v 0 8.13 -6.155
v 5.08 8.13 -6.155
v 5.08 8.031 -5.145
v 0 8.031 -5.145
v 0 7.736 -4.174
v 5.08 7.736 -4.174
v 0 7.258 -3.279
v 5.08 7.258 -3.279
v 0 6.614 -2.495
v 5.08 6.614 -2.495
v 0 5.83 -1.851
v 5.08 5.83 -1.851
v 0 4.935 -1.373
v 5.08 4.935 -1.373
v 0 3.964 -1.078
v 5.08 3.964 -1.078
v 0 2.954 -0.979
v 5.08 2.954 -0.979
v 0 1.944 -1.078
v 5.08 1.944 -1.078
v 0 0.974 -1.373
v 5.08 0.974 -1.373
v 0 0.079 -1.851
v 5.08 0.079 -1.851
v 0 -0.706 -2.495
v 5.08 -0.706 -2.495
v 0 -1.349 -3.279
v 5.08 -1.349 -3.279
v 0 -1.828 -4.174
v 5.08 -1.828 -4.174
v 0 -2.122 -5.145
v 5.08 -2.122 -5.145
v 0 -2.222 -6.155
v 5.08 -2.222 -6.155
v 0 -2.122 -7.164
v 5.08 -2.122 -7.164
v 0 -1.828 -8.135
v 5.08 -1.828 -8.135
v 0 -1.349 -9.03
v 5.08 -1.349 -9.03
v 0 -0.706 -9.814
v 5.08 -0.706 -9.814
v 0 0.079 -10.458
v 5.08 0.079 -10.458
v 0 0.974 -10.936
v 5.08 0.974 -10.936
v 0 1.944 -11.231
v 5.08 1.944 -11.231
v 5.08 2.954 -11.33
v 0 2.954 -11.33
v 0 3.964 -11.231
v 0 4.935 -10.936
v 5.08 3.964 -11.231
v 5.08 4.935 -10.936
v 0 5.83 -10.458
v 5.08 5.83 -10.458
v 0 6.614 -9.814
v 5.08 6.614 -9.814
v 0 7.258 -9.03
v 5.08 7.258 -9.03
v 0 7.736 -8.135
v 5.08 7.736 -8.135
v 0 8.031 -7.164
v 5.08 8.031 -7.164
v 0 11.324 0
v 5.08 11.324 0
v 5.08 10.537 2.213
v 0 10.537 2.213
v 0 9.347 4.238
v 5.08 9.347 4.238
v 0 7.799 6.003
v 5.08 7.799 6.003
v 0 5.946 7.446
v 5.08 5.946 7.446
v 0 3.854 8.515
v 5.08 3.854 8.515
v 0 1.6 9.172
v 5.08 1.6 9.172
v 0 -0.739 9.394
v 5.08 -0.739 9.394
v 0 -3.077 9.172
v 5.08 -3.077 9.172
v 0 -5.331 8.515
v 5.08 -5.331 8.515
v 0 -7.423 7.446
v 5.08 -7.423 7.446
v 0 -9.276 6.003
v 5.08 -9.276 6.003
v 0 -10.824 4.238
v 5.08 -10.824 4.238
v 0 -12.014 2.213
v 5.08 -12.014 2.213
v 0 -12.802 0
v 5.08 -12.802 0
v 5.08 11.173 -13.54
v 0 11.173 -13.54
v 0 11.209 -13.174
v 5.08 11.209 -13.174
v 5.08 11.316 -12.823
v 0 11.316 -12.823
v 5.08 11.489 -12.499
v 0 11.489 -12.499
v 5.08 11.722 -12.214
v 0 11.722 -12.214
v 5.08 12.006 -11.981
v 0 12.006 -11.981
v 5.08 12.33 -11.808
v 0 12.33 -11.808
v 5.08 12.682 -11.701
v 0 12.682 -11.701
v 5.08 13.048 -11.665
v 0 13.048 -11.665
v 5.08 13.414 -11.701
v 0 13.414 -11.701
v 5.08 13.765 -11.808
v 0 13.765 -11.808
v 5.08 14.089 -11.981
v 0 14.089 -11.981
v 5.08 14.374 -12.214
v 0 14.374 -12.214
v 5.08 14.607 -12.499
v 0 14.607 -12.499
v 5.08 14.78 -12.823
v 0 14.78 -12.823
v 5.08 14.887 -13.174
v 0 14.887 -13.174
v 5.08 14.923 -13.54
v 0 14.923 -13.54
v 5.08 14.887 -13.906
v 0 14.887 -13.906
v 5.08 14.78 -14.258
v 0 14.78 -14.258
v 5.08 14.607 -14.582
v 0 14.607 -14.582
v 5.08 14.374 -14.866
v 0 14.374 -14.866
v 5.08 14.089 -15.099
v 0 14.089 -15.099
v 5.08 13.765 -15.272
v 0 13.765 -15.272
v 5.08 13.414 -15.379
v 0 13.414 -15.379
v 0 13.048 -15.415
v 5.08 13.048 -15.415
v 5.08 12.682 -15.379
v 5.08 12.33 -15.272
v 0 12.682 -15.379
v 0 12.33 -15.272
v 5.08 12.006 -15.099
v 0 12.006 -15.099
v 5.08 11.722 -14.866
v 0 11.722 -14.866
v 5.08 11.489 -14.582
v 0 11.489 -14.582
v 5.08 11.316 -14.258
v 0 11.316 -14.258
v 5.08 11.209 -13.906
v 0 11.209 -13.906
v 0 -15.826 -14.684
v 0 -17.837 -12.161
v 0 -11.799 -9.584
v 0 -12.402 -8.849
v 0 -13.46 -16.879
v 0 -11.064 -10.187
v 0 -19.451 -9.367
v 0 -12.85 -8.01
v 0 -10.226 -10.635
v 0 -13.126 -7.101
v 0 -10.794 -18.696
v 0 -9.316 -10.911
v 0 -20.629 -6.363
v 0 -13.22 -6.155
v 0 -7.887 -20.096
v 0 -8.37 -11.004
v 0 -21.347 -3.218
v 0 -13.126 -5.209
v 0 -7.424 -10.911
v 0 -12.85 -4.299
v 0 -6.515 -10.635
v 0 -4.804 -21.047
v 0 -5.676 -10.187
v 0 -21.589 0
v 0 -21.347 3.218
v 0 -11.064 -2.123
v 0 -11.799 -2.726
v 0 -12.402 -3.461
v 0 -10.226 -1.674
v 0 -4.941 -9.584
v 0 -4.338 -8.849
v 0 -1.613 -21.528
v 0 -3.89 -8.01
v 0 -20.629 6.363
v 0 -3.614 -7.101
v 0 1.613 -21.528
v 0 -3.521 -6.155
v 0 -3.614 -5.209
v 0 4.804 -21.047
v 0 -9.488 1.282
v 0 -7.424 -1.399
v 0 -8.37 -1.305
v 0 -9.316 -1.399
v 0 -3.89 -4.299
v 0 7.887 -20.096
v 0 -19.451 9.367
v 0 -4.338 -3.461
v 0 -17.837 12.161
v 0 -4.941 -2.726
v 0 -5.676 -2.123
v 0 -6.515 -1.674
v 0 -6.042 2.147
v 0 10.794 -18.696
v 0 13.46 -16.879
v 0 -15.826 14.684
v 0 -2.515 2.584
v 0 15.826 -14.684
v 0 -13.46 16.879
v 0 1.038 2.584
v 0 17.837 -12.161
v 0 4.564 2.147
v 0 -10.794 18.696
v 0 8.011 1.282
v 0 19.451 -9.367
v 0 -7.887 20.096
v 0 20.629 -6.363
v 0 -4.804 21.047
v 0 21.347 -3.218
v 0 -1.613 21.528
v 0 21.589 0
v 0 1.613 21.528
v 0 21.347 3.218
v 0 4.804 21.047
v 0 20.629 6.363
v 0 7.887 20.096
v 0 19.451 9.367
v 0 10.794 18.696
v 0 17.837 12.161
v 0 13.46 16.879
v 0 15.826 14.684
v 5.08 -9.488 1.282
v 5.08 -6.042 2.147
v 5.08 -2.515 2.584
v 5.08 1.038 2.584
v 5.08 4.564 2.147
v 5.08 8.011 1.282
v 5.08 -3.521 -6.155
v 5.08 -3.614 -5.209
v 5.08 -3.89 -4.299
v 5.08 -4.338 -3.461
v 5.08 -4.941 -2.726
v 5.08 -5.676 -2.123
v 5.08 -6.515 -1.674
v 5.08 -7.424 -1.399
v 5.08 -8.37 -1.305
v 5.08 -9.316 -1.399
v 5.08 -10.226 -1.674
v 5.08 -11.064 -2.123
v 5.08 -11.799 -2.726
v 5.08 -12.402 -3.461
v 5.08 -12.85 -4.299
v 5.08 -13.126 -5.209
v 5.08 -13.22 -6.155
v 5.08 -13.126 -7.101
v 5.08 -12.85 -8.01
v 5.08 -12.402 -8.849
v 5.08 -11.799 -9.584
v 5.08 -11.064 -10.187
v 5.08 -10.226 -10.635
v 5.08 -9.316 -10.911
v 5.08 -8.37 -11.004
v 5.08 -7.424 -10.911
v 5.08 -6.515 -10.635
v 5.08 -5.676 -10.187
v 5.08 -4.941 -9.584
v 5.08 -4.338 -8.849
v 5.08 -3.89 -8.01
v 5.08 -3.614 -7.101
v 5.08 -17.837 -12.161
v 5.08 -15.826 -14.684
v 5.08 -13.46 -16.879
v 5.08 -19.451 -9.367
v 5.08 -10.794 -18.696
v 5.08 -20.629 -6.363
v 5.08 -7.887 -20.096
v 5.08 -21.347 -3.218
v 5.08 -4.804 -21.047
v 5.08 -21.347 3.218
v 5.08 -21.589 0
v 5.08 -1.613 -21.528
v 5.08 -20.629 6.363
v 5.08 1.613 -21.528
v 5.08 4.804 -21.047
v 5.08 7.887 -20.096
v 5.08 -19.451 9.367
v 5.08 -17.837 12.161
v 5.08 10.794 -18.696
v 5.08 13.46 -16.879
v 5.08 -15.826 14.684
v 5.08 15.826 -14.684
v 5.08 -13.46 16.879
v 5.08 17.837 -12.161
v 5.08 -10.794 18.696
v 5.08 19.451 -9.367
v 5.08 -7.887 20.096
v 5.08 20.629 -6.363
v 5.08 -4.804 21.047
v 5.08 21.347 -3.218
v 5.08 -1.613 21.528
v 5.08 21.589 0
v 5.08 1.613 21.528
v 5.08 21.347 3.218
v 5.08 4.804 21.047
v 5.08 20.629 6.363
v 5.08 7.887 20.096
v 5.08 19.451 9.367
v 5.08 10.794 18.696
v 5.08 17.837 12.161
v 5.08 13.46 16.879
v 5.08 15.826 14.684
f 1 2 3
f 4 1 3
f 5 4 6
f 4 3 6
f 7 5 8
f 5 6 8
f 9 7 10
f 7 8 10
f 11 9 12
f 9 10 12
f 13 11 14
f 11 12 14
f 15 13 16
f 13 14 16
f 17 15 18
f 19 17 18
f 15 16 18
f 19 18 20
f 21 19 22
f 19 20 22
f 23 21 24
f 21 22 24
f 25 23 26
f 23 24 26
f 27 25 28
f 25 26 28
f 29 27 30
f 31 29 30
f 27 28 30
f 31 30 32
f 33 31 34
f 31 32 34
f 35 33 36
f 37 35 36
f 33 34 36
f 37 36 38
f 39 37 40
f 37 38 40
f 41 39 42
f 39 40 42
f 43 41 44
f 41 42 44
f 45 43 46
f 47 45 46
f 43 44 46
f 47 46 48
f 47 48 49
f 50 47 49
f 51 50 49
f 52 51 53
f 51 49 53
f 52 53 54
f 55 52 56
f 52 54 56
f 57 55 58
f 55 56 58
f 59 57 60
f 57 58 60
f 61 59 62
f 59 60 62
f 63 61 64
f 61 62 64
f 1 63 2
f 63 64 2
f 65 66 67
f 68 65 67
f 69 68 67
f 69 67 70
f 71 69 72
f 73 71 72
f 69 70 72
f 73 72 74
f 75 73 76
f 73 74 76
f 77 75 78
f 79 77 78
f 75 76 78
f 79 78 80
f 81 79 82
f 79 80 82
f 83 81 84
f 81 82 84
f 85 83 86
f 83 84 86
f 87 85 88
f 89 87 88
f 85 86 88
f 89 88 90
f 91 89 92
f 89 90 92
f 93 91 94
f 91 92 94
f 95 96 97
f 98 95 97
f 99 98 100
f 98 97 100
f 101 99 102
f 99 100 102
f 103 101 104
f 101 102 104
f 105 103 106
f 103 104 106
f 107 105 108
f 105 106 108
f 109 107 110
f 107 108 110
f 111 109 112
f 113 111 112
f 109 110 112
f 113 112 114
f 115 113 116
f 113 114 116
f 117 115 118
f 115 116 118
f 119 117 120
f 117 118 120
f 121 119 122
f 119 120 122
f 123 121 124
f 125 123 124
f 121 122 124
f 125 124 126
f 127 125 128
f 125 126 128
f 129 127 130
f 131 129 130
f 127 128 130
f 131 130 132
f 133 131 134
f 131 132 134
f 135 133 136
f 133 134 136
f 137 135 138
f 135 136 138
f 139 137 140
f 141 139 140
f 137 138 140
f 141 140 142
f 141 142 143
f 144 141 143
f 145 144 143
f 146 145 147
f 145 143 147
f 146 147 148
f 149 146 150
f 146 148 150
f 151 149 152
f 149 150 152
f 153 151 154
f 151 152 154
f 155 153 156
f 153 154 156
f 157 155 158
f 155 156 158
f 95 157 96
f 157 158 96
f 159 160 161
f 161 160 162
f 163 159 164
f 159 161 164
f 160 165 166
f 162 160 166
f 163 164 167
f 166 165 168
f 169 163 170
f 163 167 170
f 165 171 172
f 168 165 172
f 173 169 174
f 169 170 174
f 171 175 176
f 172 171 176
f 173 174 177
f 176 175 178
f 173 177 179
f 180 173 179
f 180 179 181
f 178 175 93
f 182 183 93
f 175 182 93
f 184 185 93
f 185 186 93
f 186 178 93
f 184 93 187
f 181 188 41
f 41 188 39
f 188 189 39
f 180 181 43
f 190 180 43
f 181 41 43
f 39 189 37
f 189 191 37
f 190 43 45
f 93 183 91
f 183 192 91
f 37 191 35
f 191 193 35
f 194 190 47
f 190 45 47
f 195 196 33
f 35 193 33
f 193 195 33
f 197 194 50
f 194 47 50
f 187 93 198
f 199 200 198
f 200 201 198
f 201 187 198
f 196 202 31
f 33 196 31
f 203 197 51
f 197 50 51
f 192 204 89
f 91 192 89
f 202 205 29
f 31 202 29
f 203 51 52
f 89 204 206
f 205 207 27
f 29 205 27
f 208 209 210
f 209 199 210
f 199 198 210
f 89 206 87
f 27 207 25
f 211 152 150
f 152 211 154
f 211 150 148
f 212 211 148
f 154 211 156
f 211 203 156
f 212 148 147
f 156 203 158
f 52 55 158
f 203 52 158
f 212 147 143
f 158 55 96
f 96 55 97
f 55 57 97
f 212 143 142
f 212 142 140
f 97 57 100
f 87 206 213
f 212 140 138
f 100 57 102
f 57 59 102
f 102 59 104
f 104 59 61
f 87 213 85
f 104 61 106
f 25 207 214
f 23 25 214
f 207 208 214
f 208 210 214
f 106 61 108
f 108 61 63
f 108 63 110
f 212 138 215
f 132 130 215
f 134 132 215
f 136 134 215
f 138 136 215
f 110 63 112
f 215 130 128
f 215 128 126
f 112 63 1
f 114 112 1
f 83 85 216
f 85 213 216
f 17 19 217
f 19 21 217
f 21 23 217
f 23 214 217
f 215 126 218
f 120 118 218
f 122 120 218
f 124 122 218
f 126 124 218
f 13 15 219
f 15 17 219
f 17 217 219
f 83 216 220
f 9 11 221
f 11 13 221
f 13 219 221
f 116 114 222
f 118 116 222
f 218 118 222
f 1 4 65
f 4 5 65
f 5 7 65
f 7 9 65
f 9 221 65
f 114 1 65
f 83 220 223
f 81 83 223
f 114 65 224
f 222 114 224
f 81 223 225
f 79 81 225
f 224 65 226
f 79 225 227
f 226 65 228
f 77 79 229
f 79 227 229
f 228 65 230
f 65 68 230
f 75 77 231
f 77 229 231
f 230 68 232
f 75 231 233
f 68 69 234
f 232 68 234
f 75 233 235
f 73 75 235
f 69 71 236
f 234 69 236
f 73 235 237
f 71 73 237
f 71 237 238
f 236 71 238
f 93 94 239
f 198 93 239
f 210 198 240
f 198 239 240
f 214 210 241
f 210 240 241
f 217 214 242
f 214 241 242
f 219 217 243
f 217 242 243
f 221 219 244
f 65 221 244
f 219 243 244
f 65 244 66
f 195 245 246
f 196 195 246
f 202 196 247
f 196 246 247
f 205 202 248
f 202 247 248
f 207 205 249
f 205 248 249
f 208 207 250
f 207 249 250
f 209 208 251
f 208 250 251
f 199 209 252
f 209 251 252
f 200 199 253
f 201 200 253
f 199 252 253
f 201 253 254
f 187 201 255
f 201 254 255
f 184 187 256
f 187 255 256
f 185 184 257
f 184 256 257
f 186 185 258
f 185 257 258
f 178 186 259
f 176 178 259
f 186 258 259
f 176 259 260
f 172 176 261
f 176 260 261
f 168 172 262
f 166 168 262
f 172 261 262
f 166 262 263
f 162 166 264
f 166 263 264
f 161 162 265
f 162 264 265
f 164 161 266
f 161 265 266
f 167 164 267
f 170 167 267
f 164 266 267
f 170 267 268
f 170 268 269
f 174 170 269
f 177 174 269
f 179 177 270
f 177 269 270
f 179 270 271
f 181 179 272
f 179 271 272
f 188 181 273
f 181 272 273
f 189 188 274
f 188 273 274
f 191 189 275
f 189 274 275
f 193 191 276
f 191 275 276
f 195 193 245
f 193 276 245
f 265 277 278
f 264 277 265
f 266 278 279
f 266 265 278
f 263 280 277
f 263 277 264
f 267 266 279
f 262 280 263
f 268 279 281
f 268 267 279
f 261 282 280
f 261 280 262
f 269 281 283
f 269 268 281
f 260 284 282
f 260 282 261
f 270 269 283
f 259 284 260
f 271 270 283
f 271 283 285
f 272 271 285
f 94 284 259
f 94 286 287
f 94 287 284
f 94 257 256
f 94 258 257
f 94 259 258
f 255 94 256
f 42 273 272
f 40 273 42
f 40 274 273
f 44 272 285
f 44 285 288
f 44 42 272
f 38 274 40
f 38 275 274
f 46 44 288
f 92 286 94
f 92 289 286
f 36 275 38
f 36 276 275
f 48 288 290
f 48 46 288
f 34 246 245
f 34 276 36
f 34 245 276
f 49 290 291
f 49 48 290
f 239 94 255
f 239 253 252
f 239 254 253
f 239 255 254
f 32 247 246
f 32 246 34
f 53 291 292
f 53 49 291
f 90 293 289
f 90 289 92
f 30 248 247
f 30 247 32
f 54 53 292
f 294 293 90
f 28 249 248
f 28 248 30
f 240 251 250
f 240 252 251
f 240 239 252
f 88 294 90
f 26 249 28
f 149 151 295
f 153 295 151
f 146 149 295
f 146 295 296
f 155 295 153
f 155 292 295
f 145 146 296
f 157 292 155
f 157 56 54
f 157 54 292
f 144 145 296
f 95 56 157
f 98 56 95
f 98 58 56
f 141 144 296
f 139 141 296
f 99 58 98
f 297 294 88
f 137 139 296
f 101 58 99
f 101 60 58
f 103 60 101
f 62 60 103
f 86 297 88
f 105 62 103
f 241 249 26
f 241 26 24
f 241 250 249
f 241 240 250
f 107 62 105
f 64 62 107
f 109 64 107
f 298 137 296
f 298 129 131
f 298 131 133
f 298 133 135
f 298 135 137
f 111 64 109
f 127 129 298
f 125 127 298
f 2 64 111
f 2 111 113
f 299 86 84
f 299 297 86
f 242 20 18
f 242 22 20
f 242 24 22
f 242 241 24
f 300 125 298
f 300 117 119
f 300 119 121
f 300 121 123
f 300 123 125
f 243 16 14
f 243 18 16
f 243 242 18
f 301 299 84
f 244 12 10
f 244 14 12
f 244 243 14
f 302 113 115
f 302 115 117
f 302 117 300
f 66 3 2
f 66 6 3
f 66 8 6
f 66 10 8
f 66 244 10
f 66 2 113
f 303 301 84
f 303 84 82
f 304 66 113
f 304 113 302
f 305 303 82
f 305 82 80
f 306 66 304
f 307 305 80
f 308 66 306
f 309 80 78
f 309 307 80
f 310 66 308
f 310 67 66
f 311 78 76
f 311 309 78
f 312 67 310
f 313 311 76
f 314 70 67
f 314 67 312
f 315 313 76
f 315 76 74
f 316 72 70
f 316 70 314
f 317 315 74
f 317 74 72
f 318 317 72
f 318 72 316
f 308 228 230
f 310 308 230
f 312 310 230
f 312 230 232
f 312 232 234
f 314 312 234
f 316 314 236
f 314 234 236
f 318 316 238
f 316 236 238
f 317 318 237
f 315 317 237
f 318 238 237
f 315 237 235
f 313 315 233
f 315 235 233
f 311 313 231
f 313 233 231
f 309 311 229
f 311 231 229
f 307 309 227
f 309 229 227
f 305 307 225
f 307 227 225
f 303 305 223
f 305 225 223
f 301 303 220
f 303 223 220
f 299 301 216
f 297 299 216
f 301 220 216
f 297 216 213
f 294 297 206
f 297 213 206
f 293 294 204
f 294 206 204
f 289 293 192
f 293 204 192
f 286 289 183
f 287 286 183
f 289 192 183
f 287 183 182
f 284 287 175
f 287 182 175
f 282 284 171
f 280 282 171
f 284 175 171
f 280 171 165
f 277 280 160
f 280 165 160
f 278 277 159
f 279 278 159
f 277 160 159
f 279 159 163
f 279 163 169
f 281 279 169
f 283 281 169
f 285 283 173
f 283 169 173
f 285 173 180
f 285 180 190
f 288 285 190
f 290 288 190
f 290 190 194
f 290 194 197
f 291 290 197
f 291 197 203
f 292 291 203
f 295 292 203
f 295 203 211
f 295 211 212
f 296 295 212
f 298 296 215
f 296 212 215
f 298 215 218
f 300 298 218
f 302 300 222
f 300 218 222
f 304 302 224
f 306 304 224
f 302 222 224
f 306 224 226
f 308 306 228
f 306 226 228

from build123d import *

# Parameters (mm, degrees)
F0_R     = 21.58858
F1_DEPTH = 5.08
F2_R     = 4.849274
F2_R_2   = 5.175735
F3_DEPTH = 5.08
F4_R     = 1.874889
F5_DEPTH = 5.08


with BuildPart() as f1:
    # F0 (on Right) → F1 (new body)
    with BuildSketch(Plane.YZ):
        Circle(F0_R)
    extrude(amount=F1_DEPTH)

    # F2 (on face) → F3 (cut)
    with BuildSketch(Plane.YZ.offset(5.08)):
        with BuildLine():
            ThreePointArc((-12.801601, 0), (-0.738554, 2.638206), (11.324493, 0))
            ThreePointArc((11.324493, 0), (-0.738554, 9.394046), (-12.801601, 0))
        make_face()
        with Locations((-8.370277, -6.154616)):
            Circle(F2_R)
        with Locations((2.954216, -6.154616)):
            Circle(F2_R_2)
    extrude(amount=-F3_DEPTH, mode=Mode.SUBTRACT)

    # F4 (on face) → F5 (cut)
    with BuildSketch(Plane(origin=(0, 0, 0), x_dir=(0, -1, 0), z_dir=(-1, 0, 0))):
        with Locations((-13.047784, -13.540154)):
            Circle(F4_R)
    extrude(amount=-F5_DEPTH, mode=Mode.SUBTRACT)


solid = f1.part
